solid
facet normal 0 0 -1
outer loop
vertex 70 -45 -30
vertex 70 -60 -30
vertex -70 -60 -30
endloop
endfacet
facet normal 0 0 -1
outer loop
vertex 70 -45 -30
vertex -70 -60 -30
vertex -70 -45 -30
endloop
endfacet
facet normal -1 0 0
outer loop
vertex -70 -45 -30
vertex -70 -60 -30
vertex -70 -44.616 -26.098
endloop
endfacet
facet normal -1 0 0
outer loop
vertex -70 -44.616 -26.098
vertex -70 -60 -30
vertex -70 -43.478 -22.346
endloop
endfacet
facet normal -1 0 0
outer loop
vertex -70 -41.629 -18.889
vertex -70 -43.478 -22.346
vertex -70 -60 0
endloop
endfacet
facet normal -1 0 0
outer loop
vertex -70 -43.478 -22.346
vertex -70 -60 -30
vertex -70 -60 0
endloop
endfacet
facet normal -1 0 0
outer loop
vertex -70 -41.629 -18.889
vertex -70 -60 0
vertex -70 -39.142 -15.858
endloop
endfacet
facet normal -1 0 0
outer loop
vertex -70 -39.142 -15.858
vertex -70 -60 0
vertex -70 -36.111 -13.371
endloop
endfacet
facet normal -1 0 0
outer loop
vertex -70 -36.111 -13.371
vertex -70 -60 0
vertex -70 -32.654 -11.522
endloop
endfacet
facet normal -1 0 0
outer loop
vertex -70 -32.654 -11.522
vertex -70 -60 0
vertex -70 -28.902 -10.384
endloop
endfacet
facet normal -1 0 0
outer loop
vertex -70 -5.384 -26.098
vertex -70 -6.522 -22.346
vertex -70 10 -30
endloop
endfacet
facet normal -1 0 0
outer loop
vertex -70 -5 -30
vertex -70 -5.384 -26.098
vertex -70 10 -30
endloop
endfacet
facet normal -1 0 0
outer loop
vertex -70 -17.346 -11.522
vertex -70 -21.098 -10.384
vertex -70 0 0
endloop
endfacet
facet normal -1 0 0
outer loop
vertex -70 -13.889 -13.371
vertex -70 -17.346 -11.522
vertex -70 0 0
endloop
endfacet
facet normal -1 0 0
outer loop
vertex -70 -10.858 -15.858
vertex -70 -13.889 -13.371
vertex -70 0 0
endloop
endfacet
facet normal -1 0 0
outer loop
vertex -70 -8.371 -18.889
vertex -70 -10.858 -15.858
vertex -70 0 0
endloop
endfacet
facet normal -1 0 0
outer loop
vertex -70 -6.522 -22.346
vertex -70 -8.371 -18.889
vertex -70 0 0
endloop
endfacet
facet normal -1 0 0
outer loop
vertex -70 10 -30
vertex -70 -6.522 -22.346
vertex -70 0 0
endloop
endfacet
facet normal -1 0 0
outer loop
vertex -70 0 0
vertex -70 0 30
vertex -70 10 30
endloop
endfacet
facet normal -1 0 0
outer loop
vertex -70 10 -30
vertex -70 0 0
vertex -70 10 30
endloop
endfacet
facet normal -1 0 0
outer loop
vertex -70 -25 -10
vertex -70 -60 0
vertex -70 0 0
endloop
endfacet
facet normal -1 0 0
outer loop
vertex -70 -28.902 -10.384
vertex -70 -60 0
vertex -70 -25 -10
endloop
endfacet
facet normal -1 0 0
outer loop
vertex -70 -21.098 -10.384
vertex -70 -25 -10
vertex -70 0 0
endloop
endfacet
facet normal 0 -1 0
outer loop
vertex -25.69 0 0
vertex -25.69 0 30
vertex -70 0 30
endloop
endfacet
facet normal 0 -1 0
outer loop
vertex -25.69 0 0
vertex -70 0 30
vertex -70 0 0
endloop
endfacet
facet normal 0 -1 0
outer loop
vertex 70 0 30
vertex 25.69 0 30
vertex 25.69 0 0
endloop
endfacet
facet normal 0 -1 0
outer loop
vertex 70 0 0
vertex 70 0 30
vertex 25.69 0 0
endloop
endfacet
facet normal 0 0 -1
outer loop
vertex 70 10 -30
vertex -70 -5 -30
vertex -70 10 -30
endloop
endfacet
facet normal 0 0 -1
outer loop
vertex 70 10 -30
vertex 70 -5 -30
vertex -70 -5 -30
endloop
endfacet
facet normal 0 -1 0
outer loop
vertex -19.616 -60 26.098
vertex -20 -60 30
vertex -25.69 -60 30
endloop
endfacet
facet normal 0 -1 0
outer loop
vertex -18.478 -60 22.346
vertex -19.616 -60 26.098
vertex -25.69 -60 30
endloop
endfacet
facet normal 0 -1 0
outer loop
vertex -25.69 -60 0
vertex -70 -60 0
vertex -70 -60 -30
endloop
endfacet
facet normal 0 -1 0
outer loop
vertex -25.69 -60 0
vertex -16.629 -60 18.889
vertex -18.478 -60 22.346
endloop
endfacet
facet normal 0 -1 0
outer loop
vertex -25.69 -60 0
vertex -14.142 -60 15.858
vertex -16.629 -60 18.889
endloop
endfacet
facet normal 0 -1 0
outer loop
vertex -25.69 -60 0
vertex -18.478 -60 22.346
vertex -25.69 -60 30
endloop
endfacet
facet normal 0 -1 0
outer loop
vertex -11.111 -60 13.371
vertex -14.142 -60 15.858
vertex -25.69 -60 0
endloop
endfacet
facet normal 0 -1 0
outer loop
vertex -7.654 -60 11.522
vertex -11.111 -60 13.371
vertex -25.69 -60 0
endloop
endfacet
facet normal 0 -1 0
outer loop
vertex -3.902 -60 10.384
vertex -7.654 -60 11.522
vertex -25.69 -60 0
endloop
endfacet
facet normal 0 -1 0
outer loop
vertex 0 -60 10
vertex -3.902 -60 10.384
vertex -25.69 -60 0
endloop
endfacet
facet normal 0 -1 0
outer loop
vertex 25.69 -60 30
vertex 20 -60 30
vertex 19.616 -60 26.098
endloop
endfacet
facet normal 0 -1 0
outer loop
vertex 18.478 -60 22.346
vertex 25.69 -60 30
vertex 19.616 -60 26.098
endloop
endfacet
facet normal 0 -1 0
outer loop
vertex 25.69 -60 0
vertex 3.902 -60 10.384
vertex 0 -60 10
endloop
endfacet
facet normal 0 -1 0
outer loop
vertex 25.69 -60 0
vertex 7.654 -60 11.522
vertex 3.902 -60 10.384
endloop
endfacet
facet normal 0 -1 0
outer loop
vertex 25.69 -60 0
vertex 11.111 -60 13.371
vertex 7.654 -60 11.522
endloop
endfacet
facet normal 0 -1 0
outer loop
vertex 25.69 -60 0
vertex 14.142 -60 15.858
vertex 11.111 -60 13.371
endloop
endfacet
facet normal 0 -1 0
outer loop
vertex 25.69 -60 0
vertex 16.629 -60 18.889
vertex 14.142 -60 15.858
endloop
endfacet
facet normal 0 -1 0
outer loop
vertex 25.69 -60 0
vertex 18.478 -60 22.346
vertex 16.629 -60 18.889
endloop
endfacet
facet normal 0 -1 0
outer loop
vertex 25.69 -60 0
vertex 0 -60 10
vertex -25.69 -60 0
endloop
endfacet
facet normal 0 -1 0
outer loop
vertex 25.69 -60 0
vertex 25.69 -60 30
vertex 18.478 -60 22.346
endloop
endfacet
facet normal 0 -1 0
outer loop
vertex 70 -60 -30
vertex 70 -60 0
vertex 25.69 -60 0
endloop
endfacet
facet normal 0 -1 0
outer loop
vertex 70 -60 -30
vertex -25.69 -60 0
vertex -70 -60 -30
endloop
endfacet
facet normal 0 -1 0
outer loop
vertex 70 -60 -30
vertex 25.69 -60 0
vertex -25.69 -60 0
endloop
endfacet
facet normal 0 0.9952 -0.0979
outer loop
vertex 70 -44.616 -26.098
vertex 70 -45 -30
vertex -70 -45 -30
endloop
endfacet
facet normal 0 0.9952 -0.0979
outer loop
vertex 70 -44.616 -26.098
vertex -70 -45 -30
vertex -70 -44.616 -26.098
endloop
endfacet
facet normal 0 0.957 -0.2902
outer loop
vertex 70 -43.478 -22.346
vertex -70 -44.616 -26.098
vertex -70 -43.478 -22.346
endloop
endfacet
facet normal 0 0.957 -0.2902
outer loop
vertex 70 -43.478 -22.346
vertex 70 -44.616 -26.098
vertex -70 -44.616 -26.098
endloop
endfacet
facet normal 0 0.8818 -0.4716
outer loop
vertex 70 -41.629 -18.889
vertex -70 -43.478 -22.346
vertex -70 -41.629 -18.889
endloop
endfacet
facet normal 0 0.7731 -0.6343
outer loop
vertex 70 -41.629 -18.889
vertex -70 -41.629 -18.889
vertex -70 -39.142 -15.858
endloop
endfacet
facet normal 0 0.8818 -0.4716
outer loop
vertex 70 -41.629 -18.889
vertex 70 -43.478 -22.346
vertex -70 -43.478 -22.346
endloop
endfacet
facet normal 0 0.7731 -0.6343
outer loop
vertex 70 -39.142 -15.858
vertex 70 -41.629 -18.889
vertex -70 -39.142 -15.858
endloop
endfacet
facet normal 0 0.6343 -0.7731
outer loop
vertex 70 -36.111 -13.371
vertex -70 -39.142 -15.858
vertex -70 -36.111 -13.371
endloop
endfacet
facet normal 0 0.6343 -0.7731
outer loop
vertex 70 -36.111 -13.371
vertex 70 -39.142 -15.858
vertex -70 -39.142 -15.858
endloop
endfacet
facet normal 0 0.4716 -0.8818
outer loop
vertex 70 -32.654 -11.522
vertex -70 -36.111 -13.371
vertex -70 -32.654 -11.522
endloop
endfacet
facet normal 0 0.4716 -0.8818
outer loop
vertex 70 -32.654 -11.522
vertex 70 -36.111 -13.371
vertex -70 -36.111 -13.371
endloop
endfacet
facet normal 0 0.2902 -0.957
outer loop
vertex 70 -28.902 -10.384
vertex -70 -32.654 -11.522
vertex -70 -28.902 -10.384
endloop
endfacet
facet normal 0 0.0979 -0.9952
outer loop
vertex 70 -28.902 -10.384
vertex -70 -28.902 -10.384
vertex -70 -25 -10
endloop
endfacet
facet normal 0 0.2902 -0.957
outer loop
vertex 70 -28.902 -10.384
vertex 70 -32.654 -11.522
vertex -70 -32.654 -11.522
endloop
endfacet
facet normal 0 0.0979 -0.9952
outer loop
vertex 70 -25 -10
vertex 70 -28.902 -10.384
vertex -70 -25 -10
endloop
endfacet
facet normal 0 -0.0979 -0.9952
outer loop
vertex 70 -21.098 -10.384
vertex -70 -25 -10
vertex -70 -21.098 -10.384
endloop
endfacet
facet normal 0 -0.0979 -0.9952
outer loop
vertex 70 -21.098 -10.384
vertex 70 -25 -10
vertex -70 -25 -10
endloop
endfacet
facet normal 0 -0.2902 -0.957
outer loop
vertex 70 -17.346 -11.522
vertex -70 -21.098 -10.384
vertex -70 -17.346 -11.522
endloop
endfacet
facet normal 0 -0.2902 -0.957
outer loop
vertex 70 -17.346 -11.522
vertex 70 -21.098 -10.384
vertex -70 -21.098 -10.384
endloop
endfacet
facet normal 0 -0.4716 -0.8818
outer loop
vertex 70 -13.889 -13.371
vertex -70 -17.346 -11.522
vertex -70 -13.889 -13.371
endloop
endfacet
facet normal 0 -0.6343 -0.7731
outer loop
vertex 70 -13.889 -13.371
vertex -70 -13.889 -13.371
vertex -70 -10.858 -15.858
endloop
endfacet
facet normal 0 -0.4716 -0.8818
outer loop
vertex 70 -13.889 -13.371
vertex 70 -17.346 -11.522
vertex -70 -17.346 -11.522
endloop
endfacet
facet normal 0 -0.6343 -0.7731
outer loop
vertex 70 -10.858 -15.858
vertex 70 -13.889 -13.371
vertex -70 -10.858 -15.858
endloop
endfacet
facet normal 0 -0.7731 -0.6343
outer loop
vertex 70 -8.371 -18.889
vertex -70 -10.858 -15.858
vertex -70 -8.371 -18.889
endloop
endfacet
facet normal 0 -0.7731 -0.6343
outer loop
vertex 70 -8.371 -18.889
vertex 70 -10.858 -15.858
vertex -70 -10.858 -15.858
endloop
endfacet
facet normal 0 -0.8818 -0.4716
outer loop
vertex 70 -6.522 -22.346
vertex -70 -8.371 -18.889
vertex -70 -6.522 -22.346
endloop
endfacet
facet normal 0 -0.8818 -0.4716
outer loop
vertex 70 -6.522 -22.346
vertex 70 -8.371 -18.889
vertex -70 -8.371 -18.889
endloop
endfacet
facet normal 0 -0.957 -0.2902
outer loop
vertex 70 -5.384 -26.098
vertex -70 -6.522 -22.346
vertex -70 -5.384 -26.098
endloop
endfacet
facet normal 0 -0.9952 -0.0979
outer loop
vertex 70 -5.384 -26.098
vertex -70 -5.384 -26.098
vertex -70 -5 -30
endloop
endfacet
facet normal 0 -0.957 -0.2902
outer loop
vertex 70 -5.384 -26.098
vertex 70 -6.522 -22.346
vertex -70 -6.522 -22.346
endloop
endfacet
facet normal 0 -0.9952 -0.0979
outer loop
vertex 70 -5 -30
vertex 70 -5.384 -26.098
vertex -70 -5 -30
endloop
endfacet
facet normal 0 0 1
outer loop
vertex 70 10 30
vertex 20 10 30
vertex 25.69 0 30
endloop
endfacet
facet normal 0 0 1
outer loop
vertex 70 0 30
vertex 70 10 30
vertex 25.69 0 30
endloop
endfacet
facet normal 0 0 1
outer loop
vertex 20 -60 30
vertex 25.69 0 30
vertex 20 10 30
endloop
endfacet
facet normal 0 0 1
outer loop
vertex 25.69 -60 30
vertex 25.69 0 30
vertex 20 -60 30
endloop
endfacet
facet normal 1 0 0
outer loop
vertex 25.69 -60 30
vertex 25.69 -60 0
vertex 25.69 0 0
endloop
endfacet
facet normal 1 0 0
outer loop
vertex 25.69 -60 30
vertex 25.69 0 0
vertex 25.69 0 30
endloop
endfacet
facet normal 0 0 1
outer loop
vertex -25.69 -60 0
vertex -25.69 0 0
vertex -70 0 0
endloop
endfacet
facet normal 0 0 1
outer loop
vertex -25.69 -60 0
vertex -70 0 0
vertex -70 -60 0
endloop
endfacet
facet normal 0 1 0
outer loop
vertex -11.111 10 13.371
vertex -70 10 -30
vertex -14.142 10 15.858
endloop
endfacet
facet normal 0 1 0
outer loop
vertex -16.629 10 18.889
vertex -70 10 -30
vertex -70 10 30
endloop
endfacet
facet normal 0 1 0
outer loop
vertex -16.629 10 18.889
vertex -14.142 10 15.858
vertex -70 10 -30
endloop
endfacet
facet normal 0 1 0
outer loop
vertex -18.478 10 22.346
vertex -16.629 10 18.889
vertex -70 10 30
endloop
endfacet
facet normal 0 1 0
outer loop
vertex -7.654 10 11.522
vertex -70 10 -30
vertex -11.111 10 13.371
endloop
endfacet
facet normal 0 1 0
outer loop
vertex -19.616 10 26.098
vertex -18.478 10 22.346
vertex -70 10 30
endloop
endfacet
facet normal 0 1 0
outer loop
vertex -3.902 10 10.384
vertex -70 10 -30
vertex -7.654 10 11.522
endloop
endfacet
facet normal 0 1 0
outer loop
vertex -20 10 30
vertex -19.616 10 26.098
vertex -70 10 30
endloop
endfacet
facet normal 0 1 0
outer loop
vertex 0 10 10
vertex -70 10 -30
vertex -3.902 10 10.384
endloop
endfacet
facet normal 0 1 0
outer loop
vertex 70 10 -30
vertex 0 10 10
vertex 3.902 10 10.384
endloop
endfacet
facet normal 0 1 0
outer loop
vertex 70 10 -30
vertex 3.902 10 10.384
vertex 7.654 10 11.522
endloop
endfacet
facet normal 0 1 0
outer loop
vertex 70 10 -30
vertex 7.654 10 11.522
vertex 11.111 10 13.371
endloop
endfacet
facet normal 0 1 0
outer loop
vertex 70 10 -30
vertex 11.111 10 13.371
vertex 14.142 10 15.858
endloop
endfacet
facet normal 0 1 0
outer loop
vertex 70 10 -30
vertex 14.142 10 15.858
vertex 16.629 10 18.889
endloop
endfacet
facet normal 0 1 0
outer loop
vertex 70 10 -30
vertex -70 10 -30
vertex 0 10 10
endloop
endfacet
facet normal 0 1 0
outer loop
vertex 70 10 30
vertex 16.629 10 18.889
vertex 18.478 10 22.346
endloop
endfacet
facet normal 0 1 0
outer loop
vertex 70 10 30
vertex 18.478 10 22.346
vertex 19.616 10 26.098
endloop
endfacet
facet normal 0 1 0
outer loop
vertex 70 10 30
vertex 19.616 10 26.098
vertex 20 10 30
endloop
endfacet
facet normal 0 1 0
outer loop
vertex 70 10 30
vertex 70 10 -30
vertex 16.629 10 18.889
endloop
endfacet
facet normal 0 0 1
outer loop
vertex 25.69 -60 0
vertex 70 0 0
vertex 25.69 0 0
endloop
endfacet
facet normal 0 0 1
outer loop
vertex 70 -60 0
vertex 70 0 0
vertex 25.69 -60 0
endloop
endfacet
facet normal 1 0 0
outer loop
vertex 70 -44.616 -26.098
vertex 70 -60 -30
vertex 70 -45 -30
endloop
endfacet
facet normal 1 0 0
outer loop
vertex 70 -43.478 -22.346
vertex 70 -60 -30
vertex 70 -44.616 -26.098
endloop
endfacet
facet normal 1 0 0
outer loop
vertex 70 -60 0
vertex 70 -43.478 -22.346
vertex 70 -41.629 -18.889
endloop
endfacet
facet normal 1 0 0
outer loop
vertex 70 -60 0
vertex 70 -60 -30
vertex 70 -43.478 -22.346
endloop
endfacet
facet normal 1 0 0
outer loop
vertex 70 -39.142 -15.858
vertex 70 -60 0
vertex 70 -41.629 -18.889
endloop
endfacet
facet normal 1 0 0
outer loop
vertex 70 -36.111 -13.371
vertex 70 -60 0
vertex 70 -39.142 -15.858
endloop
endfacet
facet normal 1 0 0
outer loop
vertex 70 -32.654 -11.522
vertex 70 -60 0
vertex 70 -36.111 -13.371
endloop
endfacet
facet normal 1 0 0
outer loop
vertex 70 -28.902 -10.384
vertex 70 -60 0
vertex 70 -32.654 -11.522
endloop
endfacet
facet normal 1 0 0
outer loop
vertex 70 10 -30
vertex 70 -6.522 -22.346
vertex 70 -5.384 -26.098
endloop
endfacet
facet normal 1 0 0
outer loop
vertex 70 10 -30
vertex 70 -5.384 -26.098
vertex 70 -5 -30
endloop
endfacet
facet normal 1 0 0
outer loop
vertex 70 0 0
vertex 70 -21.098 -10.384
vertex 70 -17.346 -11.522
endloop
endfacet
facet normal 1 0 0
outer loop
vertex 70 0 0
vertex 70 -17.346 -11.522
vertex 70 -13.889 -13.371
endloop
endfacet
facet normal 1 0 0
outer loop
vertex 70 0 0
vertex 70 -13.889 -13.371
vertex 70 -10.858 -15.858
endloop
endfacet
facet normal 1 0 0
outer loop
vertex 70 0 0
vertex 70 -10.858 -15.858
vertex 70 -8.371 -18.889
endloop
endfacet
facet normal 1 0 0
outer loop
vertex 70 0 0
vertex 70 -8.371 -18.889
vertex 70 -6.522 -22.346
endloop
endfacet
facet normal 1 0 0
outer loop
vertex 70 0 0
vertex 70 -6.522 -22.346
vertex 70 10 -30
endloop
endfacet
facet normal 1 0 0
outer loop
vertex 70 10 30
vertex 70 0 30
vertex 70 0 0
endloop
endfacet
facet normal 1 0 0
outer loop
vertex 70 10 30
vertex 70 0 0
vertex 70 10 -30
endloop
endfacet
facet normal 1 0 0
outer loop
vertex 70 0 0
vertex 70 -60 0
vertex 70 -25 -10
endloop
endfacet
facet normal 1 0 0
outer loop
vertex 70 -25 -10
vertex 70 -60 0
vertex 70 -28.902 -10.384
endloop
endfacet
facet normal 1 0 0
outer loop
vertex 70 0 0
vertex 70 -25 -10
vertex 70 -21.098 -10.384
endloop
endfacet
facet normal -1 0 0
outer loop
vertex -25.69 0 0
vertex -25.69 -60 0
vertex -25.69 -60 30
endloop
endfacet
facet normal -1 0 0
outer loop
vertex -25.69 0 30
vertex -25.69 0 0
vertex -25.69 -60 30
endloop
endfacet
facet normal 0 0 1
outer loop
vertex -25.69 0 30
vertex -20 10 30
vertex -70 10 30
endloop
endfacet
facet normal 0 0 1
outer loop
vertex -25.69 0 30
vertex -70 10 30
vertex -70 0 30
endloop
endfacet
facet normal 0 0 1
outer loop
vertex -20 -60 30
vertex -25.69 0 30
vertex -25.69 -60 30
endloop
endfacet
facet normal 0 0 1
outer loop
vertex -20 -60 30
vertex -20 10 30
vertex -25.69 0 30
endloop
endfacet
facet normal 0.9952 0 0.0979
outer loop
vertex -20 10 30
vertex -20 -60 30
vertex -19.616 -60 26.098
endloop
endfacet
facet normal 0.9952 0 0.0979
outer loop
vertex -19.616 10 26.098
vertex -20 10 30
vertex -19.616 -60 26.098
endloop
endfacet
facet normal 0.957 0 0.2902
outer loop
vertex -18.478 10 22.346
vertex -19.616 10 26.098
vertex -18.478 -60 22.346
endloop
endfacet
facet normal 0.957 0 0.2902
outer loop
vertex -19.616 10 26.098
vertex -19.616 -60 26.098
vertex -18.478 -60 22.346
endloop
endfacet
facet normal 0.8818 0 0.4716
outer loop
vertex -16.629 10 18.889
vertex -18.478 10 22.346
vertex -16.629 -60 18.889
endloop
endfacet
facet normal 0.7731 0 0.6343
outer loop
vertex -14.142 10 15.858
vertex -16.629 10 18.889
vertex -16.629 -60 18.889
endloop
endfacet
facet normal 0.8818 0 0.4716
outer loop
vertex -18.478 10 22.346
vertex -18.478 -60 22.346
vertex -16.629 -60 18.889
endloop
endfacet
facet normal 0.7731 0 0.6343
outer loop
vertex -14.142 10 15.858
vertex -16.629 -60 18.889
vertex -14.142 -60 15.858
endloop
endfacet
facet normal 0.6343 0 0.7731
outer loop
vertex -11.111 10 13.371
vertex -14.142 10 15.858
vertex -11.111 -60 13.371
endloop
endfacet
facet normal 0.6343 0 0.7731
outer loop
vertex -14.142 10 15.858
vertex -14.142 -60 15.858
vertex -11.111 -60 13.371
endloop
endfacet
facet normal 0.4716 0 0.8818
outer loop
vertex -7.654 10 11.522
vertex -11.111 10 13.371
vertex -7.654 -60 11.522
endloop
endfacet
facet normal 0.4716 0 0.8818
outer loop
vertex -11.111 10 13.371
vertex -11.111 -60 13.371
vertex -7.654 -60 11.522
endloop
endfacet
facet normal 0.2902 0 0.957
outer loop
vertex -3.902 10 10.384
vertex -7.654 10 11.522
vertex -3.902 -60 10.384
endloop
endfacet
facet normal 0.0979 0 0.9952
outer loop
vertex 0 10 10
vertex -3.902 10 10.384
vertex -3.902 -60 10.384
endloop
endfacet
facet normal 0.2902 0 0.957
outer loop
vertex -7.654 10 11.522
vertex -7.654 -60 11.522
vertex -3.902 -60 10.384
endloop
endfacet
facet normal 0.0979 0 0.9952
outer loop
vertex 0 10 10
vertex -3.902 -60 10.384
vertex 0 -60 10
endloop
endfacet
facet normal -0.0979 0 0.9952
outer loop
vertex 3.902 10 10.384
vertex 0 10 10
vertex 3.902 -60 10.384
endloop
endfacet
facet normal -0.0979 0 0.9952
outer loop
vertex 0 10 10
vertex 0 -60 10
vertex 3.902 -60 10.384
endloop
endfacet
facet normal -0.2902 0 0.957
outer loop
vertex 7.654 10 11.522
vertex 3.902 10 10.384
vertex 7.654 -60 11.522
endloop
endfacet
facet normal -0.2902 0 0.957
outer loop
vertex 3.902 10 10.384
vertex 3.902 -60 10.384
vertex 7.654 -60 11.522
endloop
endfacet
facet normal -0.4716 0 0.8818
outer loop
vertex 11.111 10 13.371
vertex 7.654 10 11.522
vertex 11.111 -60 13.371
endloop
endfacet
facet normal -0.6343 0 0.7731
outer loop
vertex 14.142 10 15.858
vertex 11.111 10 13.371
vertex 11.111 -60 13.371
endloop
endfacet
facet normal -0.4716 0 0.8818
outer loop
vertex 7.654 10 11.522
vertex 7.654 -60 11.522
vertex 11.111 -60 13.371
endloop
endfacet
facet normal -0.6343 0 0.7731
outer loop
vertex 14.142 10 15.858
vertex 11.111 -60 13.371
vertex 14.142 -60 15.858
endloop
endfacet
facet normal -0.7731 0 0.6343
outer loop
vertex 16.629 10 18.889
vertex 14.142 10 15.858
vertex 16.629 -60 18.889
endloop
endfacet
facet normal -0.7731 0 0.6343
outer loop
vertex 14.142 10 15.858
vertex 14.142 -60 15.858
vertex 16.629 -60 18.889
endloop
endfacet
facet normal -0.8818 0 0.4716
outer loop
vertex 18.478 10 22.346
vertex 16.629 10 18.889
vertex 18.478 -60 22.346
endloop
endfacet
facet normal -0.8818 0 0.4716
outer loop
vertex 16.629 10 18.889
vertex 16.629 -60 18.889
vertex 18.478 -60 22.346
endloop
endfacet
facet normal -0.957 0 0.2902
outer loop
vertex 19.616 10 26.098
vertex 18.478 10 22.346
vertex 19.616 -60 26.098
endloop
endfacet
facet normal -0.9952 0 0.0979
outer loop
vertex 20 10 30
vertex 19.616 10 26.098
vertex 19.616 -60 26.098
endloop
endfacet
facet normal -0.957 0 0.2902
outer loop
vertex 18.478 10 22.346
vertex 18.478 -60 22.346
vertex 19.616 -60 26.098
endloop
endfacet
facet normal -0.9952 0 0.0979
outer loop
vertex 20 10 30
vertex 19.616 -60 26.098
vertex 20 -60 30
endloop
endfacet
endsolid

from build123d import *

# Parameters (mm, degrees)
F1_DEPTH = 70
F2_W     = 25.690172
F2_H     = 30
F3_DEPTH = 60
F6_DEPTH = 70.001


with BuildPart() as f1:
    # F0 (on Right) → F1 (new body, symmetric)
    with BuildSketch(Plane.YZ):
        with BuildLine():
            Line((10, 30), (0, 30))
            Line((0, 30), (0, 0))
            Line((0, 0), (-60, 0))
            Line((-60, 0), (-60, -30))
            Line((-60, -30), (-45, -30))
            ThreePointArc((-45, -30), (-25, -10), (-5, -30))
            Line((-5, -30), (0, -30))
            Line((0, -30), (10, -30))
            Line((10, -30), (10, 30))
        make_face()
    extrude(amount=F1_DEPTH, both=True)

    # F2 (on face) → F3 (join)
    with BuildSketch(Plane.XZ):
        with Locations((12.845086, 15)):
            Rectangle(F2_W, F2_H)
    extrude(amount=F3_DEPTH)

    # F4: F1 across plane


with BuildPart() as f1_1:
    add(f1.part)
    add(f1.part.mirror(Plane.YZ))

    # F5 (on face) → F6 (cut, through all)
    with BuildSketch(Plane.XZ.offset(60)):
        with BuildLine():
            Line((20, 30), (-20, 30))
            ThreePointArc((-20, 30), (0, 10), (20, 30))
        make_face()
    extrude(amount=-F6_DEPTH, mode=Mode.SUBTRACT)


solid = f1_1.part
